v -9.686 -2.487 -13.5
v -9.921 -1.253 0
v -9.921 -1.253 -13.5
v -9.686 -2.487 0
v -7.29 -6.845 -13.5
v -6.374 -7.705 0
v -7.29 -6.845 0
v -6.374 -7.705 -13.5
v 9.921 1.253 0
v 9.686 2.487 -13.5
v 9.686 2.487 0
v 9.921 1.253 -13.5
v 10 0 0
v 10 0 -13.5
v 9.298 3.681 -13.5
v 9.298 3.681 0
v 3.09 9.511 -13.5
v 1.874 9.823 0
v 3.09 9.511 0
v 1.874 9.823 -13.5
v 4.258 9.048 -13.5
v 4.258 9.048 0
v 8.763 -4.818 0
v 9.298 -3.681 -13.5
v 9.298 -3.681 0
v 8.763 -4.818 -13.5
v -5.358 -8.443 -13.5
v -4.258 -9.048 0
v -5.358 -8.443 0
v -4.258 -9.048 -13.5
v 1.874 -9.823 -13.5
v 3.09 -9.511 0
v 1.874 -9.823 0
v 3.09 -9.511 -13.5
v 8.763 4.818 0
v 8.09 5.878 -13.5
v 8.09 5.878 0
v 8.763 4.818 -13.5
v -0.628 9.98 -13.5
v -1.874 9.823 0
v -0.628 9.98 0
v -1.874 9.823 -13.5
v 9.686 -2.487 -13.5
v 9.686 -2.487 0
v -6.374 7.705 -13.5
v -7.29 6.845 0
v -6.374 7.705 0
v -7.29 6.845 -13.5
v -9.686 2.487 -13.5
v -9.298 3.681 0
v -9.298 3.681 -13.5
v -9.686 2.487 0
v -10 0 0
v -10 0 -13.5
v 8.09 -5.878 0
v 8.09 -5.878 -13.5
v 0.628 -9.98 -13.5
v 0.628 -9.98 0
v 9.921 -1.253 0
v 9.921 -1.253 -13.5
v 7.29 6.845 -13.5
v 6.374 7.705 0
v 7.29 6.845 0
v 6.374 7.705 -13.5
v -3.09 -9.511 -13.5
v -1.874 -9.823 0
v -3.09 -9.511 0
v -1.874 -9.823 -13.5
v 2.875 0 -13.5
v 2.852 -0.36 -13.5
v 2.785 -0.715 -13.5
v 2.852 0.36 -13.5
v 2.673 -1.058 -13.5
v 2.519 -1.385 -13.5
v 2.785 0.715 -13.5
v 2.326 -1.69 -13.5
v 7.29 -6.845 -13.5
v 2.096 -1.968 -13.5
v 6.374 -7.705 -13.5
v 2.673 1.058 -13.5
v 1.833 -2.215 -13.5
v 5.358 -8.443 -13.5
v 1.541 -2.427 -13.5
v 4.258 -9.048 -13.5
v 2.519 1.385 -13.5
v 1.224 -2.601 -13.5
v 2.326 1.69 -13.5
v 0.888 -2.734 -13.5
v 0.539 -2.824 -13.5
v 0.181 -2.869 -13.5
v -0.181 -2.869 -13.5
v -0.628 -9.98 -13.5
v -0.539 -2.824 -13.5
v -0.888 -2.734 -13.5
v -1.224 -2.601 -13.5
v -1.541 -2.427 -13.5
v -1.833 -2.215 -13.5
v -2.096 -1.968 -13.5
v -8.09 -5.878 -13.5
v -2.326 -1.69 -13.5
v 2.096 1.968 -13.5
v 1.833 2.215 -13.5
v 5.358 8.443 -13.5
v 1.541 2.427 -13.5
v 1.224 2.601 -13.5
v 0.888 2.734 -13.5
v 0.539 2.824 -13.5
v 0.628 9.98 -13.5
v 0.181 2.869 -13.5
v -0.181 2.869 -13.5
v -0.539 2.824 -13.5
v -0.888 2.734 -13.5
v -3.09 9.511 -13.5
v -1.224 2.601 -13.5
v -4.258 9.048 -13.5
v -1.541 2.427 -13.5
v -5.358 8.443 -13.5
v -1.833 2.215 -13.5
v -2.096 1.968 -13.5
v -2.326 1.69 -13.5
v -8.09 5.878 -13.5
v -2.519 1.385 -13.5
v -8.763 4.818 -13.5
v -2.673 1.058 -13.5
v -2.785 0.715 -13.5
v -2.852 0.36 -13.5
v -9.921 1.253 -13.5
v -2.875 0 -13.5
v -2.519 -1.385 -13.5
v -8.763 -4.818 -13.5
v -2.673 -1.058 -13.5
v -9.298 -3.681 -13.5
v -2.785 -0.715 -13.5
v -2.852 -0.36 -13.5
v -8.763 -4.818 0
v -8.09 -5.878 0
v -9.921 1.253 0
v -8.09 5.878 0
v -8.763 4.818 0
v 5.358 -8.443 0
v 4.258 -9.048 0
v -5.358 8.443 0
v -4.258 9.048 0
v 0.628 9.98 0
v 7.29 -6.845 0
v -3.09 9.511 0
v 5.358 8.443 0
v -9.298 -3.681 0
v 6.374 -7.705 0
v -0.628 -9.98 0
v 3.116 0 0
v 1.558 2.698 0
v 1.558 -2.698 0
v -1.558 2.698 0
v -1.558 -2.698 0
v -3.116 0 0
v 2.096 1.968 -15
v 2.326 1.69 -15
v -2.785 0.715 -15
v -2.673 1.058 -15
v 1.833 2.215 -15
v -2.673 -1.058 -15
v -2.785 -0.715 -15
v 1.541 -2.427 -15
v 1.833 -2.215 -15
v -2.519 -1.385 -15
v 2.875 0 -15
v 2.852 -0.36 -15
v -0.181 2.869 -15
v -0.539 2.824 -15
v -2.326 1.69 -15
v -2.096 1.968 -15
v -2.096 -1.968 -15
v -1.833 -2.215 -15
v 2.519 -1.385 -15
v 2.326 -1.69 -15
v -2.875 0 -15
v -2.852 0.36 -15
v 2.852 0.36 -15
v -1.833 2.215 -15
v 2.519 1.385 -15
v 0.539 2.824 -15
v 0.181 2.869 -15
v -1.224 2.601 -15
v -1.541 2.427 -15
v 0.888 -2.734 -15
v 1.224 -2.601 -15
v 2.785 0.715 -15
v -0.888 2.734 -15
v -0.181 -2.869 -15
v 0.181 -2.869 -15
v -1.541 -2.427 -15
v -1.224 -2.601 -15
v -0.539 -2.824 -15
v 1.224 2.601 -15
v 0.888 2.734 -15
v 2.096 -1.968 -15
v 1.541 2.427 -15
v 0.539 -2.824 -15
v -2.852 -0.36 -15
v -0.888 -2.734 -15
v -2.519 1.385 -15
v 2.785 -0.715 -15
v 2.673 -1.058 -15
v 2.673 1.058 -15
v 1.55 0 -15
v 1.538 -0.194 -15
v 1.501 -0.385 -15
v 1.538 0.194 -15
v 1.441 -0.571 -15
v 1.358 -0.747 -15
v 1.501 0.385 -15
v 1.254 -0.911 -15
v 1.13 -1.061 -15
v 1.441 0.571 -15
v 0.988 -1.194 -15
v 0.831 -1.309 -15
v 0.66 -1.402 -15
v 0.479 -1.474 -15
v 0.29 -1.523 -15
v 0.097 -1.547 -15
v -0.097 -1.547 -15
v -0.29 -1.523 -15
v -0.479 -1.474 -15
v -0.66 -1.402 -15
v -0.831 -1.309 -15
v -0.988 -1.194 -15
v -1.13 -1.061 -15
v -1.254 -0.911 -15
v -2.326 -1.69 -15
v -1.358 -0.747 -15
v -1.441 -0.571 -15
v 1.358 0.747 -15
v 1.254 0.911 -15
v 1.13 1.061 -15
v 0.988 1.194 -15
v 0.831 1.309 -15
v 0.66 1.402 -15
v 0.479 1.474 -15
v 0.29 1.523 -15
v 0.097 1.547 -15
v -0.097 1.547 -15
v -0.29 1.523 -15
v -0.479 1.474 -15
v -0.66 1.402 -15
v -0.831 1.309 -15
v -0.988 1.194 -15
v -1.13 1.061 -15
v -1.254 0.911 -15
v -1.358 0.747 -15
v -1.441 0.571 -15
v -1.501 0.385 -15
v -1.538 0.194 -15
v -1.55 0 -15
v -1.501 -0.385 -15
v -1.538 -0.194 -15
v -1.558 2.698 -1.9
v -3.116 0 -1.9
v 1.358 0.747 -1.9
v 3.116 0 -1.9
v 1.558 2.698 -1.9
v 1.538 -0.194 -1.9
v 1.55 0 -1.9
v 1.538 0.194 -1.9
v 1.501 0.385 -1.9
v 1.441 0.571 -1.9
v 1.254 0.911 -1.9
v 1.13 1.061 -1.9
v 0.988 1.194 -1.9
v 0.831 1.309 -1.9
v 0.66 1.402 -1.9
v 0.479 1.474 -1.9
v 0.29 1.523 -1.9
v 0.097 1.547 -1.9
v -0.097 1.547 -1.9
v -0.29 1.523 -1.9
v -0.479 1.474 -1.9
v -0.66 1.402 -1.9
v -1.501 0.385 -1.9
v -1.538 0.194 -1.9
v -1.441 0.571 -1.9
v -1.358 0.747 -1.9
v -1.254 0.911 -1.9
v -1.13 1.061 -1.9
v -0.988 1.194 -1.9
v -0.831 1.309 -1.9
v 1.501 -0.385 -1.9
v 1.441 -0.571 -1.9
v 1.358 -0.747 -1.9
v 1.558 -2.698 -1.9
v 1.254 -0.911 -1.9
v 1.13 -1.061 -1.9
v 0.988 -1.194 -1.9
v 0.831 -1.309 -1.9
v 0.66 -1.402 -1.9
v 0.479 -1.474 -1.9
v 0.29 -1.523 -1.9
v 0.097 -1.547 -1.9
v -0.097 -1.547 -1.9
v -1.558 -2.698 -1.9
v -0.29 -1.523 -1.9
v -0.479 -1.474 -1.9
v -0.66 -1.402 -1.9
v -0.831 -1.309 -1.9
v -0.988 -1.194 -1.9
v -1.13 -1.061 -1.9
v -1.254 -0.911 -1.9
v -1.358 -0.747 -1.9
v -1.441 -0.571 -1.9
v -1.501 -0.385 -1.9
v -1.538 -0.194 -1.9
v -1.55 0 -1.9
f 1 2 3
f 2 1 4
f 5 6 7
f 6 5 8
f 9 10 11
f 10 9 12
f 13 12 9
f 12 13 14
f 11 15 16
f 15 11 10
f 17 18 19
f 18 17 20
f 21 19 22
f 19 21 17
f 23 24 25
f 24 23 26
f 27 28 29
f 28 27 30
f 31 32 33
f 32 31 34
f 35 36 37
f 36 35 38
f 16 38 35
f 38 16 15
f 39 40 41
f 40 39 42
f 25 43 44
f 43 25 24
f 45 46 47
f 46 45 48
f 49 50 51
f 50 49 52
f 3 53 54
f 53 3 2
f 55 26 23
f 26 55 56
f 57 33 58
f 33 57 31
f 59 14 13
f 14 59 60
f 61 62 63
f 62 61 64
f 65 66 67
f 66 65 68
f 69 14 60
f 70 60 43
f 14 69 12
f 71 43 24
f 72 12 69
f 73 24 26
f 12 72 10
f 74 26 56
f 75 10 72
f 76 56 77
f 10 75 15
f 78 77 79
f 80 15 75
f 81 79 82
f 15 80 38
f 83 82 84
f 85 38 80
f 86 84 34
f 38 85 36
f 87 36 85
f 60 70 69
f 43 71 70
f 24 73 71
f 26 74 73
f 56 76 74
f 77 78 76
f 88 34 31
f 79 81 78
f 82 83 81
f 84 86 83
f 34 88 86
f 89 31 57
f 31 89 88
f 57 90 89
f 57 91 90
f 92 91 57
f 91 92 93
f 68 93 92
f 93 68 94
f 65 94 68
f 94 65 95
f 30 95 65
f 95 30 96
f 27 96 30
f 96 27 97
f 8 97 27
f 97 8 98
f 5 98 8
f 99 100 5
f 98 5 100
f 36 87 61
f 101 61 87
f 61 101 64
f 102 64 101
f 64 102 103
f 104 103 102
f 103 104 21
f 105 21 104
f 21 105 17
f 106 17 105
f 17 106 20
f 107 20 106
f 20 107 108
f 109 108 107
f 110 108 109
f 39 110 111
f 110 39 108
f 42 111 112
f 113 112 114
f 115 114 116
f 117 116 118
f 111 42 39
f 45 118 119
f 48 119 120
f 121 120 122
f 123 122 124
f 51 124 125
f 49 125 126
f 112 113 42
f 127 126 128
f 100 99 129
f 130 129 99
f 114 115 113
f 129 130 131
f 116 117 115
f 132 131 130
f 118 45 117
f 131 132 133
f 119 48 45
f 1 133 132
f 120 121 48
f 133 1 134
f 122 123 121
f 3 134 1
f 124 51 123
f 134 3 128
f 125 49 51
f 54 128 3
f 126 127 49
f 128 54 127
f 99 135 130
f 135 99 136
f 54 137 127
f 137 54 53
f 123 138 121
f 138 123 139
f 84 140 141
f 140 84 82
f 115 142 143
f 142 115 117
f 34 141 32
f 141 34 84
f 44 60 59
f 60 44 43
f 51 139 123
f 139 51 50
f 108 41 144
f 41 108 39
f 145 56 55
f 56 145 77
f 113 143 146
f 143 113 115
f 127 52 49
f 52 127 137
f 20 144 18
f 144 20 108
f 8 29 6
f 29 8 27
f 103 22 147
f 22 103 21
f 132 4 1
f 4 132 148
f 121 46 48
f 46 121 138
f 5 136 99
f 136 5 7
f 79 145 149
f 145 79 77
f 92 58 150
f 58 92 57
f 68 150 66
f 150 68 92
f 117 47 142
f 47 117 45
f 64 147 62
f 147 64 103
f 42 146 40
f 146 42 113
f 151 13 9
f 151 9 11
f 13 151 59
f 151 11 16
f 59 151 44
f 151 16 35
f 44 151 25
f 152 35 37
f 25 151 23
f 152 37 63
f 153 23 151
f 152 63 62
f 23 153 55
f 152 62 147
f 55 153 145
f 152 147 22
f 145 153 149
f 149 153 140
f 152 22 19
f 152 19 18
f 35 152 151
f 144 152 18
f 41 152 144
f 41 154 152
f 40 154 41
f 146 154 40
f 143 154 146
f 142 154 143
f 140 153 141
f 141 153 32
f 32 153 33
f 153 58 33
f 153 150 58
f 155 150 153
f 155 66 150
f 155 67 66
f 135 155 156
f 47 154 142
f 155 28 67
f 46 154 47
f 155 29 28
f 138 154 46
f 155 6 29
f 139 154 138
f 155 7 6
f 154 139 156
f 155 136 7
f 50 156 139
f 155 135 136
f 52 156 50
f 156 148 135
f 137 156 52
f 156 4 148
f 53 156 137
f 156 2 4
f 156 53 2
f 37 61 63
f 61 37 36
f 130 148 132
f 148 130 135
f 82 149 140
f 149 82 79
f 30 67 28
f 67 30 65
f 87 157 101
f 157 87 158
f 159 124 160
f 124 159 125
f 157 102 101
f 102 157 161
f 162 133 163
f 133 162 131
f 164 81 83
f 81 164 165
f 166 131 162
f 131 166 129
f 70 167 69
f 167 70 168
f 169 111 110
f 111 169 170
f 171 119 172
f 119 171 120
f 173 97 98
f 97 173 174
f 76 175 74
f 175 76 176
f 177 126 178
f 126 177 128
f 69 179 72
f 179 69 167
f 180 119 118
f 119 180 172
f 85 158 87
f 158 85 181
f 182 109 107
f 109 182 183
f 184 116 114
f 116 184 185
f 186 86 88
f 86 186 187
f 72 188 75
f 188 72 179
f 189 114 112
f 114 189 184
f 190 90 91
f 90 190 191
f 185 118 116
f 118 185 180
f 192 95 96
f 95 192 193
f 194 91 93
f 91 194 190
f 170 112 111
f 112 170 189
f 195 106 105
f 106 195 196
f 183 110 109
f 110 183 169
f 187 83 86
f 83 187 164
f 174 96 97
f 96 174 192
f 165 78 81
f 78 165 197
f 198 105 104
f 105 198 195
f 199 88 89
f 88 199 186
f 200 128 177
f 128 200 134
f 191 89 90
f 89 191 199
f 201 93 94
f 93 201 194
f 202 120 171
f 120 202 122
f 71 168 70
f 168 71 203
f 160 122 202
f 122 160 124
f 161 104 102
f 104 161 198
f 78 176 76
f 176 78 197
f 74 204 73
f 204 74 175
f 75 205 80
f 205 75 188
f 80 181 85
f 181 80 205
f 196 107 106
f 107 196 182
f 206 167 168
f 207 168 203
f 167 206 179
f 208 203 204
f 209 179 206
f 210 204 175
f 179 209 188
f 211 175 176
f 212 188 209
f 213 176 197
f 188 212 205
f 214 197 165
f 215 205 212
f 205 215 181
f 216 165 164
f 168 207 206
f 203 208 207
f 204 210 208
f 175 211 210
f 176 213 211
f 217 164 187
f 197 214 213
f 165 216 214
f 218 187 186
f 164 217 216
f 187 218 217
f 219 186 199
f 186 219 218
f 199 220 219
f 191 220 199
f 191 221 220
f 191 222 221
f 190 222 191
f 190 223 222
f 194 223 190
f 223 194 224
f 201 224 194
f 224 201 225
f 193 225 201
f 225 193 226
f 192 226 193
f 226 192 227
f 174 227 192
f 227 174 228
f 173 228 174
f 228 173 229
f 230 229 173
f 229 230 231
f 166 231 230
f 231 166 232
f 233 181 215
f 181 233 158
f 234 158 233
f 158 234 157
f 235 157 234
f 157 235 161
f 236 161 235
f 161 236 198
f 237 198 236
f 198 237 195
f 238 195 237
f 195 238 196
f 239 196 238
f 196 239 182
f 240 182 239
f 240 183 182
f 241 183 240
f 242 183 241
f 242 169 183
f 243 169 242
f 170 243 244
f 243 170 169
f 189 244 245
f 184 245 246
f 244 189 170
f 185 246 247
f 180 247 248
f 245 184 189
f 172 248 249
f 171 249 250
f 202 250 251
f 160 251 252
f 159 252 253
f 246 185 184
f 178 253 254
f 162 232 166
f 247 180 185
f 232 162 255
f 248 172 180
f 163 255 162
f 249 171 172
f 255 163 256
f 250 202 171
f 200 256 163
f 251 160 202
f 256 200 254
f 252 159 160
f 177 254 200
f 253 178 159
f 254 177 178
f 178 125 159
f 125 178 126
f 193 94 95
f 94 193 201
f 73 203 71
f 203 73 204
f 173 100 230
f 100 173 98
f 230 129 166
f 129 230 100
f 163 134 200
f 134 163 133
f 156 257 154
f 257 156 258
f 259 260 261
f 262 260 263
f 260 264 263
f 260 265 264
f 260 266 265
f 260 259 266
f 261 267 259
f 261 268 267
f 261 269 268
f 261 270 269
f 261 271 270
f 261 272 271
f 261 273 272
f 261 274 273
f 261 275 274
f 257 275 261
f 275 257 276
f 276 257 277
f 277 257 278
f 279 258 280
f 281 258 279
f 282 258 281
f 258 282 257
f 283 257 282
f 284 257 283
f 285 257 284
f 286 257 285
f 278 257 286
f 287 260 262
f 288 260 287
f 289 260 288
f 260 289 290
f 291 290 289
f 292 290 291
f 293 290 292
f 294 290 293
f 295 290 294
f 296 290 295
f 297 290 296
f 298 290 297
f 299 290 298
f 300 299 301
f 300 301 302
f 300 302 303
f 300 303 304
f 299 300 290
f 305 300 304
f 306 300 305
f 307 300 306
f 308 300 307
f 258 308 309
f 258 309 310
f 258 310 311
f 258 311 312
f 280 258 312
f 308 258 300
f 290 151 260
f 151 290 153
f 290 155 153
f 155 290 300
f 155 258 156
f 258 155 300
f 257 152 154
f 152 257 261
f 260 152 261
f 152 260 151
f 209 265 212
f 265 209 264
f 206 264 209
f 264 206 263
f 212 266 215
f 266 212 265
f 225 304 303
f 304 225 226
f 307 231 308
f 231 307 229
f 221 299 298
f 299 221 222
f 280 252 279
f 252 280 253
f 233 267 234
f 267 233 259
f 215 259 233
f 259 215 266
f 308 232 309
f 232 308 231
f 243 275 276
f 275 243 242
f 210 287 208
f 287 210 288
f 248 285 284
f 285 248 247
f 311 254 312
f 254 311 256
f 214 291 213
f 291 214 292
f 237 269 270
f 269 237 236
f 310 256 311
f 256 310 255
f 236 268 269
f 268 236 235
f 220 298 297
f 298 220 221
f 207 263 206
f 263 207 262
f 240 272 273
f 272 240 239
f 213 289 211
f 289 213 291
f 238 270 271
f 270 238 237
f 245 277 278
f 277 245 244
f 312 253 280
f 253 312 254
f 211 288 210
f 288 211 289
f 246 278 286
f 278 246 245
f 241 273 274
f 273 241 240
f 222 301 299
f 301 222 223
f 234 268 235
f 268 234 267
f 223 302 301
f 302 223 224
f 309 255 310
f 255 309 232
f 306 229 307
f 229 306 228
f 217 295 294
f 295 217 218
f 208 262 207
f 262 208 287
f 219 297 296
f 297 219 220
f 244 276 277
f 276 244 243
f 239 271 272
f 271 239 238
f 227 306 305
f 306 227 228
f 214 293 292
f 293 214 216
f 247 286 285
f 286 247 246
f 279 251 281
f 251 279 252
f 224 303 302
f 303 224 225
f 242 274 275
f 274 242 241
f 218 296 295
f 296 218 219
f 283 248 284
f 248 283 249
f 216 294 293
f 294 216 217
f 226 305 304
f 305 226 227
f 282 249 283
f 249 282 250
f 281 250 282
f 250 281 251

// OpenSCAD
$fn = 50;

difference() {
	union() {
		translate(v = [0, 0, -13.5]) {
			cylinder(h = 13.5, r = 10.0);
		}
		#translate(v = [0, 0, -15.0]) {
			cylinder(h = 15, r = 2.875);
		}
	}
	union() {
		translate(v = [0, 0, 0]) {
			rotate(a = [0, 0, 0]) {
				difference() {
					union() {
						translate(v = [0, 0, -1.9]) {
							linear_extrude(height = 1.9) {
								polygon(points = [[3.1158, 0.0], [1.5579000000000005, 2.698361953111554], [-1.5578999999999994, 2.6983619531115544], [-3.1158, 3.815754496783323e-16], [-1.5579000000000014, -2.6983619531115535], [1.557899999999998, -2.6983619531115552]]);
							}
						}
					}
					union();
				}
			}
		}
		#translate(v = [0, 0, -100.0]) {
			cylinder(h = 200, r = 1.55);
		}
	}
}
